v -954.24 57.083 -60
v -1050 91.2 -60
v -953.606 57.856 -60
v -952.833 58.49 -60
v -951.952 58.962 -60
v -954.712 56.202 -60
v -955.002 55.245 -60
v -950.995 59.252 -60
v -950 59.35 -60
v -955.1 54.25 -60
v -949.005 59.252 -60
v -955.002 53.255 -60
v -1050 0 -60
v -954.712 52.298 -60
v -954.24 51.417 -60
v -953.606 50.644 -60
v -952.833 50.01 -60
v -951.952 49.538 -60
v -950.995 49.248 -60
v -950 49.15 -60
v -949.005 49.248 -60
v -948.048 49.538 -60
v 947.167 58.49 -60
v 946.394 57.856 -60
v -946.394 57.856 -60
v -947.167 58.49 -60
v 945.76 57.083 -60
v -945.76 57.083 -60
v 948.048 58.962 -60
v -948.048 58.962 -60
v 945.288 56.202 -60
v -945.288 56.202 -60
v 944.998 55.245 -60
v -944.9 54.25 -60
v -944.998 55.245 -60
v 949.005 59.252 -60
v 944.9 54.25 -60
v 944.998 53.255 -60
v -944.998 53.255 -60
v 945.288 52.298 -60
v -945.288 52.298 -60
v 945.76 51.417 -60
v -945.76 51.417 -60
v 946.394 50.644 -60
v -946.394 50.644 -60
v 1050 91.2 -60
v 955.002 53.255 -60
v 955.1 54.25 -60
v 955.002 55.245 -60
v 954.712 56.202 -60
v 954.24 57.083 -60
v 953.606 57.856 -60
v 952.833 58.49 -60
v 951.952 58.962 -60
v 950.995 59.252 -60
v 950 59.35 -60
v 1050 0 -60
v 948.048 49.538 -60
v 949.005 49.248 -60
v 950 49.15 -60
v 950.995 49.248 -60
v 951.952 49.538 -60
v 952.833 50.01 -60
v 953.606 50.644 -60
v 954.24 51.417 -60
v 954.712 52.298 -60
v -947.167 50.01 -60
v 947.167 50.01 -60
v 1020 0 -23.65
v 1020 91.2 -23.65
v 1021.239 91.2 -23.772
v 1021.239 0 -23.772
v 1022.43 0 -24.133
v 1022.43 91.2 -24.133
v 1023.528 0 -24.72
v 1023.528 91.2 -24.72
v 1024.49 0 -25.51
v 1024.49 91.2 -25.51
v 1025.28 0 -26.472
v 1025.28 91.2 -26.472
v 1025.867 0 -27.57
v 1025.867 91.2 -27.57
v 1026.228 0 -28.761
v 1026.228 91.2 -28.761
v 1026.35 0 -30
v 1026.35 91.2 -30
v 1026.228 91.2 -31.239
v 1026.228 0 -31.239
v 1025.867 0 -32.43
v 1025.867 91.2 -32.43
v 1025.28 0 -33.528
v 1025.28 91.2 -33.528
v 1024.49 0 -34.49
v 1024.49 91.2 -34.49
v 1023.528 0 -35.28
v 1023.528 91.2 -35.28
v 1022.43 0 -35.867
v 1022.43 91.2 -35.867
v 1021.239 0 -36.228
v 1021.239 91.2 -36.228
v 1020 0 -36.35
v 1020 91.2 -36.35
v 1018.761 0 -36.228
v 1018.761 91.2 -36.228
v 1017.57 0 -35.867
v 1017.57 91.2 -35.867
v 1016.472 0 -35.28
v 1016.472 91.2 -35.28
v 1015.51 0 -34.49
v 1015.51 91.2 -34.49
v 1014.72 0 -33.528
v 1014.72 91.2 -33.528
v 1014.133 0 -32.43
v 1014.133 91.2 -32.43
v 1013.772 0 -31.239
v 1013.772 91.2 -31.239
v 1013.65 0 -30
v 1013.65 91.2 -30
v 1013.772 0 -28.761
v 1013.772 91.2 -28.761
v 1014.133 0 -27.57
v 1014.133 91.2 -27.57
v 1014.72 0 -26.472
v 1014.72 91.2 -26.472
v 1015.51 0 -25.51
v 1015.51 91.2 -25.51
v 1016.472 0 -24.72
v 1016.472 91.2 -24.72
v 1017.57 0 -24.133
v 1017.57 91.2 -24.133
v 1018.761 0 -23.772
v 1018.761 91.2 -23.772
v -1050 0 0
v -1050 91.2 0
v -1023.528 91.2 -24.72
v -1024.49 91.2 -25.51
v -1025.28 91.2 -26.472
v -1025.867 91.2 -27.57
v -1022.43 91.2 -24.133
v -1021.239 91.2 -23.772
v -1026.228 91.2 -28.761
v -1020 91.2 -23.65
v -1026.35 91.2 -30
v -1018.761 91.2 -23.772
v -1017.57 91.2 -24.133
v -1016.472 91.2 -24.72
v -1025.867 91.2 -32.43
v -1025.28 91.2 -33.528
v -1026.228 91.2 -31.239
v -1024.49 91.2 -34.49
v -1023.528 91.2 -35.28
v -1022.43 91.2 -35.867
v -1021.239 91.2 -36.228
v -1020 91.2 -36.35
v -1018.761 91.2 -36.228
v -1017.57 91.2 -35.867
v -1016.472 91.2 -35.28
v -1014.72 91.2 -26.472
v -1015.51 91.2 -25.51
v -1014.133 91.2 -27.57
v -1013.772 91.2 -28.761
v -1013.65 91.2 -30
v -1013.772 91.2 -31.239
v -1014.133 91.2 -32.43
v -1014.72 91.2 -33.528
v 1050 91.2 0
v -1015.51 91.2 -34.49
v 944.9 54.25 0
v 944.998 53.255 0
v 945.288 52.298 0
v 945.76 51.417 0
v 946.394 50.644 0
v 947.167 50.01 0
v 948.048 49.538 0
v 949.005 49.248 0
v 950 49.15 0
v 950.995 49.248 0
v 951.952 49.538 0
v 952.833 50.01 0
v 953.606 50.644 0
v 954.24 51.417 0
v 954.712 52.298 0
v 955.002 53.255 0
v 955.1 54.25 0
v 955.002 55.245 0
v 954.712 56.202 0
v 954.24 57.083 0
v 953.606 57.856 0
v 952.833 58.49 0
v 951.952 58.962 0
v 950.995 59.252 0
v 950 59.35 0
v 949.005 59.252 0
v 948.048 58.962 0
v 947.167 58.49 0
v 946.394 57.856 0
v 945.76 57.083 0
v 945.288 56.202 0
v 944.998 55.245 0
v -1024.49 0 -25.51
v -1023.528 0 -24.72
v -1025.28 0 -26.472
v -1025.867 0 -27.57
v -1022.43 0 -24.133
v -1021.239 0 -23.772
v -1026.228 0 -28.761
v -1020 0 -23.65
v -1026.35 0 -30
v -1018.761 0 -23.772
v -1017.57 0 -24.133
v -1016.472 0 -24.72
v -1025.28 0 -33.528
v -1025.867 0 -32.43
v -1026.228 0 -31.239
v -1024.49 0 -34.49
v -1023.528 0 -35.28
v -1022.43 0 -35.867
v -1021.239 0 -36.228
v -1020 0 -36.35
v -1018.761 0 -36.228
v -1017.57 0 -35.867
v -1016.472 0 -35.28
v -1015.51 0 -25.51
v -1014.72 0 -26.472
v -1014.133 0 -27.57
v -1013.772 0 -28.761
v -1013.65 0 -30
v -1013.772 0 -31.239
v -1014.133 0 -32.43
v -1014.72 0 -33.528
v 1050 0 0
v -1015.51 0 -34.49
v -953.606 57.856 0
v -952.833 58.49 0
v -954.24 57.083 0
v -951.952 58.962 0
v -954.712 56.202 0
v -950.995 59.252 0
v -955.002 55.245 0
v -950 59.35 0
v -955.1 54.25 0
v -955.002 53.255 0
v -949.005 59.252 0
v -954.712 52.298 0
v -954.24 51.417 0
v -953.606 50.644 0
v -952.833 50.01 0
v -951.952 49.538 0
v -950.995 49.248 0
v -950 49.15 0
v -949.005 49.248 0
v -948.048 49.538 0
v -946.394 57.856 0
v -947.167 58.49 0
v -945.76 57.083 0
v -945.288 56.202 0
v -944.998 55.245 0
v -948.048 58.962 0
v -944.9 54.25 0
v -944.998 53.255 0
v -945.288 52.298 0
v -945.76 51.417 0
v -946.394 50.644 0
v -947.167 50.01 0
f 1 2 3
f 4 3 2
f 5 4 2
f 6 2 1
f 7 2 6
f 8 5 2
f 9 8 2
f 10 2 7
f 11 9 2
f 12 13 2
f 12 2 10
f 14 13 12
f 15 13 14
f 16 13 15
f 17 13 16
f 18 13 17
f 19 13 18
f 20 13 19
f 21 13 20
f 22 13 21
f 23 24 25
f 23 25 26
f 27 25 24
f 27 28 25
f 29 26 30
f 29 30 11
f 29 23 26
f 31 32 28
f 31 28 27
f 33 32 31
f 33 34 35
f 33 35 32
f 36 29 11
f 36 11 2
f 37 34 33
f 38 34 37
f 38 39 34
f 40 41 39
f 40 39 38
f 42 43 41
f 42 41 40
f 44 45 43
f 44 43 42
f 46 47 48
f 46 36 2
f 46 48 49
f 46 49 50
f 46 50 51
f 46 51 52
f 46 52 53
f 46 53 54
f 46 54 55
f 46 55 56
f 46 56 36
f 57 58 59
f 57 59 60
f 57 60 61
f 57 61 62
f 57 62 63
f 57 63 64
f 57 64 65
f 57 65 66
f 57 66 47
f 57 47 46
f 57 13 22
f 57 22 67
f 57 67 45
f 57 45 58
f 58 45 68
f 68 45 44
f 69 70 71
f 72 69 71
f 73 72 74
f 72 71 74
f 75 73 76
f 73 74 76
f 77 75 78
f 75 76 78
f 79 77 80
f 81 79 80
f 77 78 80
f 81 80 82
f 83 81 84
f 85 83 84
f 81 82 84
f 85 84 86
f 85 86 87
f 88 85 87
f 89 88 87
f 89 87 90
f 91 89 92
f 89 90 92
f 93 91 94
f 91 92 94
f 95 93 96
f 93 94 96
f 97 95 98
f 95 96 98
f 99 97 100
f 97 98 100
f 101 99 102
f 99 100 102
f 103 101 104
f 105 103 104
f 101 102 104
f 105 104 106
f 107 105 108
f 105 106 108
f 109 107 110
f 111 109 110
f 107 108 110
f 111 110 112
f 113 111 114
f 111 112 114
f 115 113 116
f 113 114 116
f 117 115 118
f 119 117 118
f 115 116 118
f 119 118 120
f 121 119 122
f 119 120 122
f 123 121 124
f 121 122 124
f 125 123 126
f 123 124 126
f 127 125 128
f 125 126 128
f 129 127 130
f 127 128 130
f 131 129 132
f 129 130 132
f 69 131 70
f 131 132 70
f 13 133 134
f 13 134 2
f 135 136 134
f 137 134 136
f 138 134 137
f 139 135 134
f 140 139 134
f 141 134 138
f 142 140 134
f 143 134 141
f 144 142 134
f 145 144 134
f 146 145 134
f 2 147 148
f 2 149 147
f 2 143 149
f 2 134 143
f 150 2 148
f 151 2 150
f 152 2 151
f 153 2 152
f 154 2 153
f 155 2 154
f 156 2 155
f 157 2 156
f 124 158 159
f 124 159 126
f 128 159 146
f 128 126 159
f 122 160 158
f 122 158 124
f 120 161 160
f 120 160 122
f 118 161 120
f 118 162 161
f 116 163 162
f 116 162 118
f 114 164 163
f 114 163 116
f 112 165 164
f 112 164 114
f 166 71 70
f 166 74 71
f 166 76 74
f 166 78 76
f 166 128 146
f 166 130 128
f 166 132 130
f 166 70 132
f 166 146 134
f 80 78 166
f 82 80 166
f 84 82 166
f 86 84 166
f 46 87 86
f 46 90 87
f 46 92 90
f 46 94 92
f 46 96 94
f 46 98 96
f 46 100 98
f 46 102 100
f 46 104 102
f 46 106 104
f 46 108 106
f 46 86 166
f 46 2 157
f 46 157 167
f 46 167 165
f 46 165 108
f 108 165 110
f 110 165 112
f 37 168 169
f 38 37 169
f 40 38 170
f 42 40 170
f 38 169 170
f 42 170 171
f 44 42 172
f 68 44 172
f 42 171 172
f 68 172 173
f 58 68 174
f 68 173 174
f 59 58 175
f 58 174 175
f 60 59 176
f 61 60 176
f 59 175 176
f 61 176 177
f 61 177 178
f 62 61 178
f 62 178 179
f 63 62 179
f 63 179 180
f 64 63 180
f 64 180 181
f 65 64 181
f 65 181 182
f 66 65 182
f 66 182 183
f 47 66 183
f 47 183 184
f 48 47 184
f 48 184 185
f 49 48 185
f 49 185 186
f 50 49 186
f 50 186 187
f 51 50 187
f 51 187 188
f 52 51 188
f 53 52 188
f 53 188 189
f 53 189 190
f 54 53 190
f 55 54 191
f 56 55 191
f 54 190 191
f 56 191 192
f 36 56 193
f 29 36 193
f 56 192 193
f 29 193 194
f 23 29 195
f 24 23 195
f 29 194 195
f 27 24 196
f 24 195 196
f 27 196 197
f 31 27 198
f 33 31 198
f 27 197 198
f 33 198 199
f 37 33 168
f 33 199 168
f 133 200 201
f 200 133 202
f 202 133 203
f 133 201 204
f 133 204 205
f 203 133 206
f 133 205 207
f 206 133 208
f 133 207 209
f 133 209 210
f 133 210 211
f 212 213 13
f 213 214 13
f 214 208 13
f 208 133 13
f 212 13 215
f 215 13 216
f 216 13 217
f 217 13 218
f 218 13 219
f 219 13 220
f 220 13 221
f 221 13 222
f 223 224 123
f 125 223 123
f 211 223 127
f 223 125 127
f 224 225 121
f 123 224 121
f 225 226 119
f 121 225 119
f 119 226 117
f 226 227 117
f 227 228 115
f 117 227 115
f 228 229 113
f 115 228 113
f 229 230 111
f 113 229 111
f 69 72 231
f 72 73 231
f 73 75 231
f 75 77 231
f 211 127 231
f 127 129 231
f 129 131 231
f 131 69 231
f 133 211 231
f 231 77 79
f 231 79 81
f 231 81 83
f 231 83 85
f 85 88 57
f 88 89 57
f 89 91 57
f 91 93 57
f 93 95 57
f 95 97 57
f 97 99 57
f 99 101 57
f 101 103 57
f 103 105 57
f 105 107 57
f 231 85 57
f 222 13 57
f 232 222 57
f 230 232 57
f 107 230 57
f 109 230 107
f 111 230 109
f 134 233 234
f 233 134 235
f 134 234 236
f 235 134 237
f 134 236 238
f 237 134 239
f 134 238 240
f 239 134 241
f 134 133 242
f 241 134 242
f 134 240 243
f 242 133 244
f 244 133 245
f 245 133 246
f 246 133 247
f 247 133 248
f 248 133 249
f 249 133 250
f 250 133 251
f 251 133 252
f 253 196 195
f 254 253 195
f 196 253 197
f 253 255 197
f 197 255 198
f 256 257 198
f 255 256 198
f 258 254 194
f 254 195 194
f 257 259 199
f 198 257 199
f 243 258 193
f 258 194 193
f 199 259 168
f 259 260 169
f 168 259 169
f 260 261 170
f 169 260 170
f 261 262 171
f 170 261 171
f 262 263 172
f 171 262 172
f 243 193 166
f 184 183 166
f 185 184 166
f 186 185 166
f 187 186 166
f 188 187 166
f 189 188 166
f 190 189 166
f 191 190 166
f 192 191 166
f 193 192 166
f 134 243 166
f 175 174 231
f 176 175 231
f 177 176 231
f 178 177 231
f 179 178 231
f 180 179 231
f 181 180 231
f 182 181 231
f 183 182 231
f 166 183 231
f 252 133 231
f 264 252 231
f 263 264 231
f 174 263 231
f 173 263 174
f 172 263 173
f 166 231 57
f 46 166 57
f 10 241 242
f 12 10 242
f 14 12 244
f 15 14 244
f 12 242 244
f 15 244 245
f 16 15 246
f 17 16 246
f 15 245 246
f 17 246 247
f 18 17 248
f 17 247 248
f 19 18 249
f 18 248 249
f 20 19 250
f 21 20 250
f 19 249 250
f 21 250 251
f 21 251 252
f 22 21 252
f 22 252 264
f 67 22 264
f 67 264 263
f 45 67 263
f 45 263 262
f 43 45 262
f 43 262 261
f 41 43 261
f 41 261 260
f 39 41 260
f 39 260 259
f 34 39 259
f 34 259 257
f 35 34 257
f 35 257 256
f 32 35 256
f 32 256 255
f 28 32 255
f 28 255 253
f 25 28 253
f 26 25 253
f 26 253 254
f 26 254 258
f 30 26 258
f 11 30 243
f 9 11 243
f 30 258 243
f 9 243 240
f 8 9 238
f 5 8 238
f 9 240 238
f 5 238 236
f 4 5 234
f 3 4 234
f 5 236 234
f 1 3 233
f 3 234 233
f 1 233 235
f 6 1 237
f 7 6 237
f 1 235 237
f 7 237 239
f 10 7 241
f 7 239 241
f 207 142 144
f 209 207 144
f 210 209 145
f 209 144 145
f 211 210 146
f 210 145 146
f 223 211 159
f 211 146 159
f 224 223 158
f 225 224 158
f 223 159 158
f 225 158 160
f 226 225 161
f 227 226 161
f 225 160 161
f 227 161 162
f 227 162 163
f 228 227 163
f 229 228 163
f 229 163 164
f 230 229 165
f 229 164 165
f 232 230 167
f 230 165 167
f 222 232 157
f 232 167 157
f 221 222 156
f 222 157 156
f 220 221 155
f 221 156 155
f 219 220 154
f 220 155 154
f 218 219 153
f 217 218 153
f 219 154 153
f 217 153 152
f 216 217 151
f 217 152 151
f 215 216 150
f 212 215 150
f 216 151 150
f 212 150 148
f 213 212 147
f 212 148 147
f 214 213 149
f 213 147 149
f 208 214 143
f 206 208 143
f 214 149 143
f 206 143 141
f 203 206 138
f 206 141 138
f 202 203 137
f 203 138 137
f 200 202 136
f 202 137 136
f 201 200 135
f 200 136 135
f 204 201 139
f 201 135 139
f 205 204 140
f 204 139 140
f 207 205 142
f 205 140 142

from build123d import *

# Parameters (mm, degrees)
SKETCH1_W           = 2100
SKETCH1_H           = 60
BOSS_EXTRUDE1_DEPTH = 91.2
SKETCH2_R           = 5.1
CUT_EXTRUDE1_DEPTH  = 1056.659717902
CUT_EXTRUDE2_START  = 91.2
SKETCH3_R           = 6.35
CUT_EXTRUDE2_DEPTH  = 91.2


with BuildPart() as part:
    # Sketch1 → Boss-Extrude1 (new body)
    with BuildSketch(Plane(origin=(0, 0, 0), x_dir=(1, 0, 0), z_dir=(0, 1, 0))):
        with Locations((0, 30)):
            Rectangle(SKETCH1_W, SKETCH1_H)
    extrude(amount=BOSS_EXTRUDE1_DEPTH)

    # Sketch2 → Cut-Extrude1 (cut, through all)
    with BuildSketch(Plane.XY):
        with Locations(Location((-950, 54.25, 0), (0, 0, 180))):
            Circle(SKETCH2_R)
        with Locations(Location((950, 54.25, 0), (0, 0, 180))):
            Circle(SKETCH2_R)
    extrude(amount=-CUT_EXTRUDE1_DEPTH, mode=Mode.SUBTRACT)

    # Sketch3 → Cut-Extrude2 (cut)
    with BuildSketch(Plane(origin=(0, 0, 0), x_dir=(1, 0, 0), z_dir=(0, 1, 0)).offset(CUT_EXTRUDE2_START)):
        with Locations(Location((1020, 30, 0), (0, 0, 270))):
            Circle(SKETCH3_R)
        with Locations(Location((-1020, 30, 0), (0, 0, 270))):
            Circle(SKETCH3_R)
    extrude(amount=-CUT_EXTRUDE2_DEPTH, mode=Mode.SUBTRACT)


solid = part.part
